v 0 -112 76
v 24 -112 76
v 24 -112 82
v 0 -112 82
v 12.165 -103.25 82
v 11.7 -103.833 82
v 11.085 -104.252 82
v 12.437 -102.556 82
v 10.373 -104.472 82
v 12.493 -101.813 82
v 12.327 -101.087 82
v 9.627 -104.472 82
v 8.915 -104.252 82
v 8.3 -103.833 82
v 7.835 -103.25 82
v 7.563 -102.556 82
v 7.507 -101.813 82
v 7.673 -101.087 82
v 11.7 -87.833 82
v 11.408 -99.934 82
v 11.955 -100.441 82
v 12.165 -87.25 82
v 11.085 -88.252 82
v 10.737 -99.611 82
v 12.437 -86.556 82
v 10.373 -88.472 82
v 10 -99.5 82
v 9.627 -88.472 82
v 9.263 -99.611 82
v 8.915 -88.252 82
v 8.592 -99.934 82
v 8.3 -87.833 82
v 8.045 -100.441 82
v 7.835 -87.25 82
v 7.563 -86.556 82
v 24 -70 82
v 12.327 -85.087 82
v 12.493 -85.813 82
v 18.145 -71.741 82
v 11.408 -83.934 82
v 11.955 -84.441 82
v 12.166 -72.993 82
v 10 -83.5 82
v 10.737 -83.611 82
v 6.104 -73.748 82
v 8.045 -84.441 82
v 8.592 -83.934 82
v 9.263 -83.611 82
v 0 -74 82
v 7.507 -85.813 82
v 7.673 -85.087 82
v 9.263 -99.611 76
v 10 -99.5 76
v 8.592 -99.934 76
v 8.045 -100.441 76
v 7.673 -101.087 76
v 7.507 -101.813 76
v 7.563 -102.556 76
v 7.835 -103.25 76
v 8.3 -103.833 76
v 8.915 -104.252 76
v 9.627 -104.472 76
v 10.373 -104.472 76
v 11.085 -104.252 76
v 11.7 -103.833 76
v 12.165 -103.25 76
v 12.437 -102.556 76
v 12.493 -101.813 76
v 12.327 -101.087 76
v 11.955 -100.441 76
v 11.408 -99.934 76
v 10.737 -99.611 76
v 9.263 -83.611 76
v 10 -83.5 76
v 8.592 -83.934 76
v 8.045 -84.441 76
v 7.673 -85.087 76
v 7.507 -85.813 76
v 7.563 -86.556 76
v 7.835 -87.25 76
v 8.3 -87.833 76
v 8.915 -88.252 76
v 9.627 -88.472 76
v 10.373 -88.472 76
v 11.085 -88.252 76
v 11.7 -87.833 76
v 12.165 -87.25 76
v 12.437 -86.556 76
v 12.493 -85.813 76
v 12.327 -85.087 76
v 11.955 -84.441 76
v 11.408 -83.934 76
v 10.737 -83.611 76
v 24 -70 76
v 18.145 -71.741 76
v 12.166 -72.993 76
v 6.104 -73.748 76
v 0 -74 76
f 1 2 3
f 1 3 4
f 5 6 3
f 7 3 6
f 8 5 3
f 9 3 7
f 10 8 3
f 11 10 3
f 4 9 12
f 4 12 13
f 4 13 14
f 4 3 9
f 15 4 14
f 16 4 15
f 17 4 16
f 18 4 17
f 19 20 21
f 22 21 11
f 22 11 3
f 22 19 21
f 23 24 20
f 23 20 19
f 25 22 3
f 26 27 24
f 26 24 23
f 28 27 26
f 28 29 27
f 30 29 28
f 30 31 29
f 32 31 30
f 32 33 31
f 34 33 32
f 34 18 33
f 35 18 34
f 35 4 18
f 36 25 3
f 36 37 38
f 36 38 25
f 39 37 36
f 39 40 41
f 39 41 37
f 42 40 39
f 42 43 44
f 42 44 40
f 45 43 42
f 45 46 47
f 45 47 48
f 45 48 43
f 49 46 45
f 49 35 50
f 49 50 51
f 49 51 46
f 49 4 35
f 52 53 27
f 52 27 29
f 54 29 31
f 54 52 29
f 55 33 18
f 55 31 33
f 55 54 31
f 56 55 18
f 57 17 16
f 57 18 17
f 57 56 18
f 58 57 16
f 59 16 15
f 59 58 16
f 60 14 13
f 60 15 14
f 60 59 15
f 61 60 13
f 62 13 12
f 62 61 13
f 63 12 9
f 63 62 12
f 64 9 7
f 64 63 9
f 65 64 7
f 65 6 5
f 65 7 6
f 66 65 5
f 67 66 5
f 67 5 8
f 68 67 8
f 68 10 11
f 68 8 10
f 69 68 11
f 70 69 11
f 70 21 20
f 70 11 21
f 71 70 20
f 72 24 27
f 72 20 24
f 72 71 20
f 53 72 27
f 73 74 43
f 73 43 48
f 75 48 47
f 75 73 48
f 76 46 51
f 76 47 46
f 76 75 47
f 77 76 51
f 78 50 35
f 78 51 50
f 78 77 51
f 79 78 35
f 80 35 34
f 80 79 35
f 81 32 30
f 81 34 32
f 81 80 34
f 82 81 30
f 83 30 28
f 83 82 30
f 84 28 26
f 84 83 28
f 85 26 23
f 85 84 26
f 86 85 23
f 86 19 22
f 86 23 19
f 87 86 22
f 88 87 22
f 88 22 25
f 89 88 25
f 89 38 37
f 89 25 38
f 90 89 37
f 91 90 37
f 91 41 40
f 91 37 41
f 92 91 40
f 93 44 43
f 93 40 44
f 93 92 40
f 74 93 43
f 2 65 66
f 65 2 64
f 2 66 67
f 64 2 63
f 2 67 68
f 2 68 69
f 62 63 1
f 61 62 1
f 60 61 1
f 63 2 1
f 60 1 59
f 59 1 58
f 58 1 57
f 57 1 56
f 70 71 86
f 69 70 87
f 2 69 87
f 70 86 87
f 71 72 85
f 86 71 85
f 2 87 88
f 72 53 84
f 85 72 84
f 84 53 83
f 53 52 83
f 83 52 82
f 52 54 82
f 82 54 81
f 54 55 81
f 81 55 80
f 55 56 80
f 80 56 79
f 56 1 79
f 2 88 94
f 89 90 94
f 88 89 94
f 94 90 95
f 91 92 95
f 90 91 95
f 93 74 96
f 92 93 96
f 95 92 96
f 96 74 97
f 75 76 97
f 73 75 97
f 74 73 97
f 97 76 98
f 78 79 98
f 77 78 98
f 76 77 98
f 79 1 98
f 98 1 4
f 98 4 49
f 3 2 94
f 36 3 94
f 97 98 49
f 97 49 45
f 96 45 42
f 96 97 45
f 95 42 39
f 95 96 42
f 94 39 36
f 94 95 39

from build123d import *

# Parameters (mm, degrees)
CYLINDER963_R          = 2.5
CYLINDER963_DEPTH      = 20
CYLINDER961_R          = 2.5
CYLINDER961_DEPTH      = 20
CYLINDER962_R          = 74
CYLINDER962_DEPTH      = 10
BOX477_W               = 51
BOX477_H               = 24
BOX477_DEPTH           = 6
CUT444_PLACEMENT_ANGLE = 90


with BuildPart() as v_lec963:
    # Cylinder963 → Cylinder963 (new body)
    with BuildSketch(Plane(origin=(-86, -10, 66), x_dir=(1, 0, 0), z_dir=(0, 0, 1))):
        Circle(CYLINDER963_R)
    extrude(amount=CYLINDER963_DEPTH)


with BuildPart() as compound519:
    # Cylinder961 → Cylinder961 (new body)
    with BuildSketch(Plane(origin=(-102, -10, 66), x_dir=(1, 0, 0), z_dir=(0, 0, 1))):
        Circle(CYLINDER961_R)
    extrude(amount=CYLINDER961_DEPTH)

    # Compound519: union Válec963
    add(v_lec963.part)


with BuildPart() as v_lec962:
    # Cylinder962 → Cylinder962 (new body)
    with BuildSketch(Plane.XY.offset(72)):
        Circle(CYLINDER962_R)
    extrude(amount=CYLINDER962_DEPTH)


with BuildPart() as cut444:
    # Box477 → Box477 (new body)
    with BuildSketch(Plane(origin=(-112, -24, 76), x_dir=(1, 0, 0), z_dir=(0, 0, 1))):
        with Locations((25.5, 12)):
            Rectangle(BOX477_W, BOX477_H)
    extrude(amount=BOX477_DEPTH)

    # Cut445: cut Válec962
    add(v_lec962.part, mode=Mode.SUBTRACT)

    # Cut444: cut Compound519
    add(compound519.part, mode=Mode.SUBTRACT)


with BuildPart() as cut444_1:
    # Cut444 placement: moved
    add(cut444.part.rotate(Axis((0, 0, 0), (0, 0, 1)), CUT444_PLACEMENT_ANGLE))


solid = cut444_1.part
